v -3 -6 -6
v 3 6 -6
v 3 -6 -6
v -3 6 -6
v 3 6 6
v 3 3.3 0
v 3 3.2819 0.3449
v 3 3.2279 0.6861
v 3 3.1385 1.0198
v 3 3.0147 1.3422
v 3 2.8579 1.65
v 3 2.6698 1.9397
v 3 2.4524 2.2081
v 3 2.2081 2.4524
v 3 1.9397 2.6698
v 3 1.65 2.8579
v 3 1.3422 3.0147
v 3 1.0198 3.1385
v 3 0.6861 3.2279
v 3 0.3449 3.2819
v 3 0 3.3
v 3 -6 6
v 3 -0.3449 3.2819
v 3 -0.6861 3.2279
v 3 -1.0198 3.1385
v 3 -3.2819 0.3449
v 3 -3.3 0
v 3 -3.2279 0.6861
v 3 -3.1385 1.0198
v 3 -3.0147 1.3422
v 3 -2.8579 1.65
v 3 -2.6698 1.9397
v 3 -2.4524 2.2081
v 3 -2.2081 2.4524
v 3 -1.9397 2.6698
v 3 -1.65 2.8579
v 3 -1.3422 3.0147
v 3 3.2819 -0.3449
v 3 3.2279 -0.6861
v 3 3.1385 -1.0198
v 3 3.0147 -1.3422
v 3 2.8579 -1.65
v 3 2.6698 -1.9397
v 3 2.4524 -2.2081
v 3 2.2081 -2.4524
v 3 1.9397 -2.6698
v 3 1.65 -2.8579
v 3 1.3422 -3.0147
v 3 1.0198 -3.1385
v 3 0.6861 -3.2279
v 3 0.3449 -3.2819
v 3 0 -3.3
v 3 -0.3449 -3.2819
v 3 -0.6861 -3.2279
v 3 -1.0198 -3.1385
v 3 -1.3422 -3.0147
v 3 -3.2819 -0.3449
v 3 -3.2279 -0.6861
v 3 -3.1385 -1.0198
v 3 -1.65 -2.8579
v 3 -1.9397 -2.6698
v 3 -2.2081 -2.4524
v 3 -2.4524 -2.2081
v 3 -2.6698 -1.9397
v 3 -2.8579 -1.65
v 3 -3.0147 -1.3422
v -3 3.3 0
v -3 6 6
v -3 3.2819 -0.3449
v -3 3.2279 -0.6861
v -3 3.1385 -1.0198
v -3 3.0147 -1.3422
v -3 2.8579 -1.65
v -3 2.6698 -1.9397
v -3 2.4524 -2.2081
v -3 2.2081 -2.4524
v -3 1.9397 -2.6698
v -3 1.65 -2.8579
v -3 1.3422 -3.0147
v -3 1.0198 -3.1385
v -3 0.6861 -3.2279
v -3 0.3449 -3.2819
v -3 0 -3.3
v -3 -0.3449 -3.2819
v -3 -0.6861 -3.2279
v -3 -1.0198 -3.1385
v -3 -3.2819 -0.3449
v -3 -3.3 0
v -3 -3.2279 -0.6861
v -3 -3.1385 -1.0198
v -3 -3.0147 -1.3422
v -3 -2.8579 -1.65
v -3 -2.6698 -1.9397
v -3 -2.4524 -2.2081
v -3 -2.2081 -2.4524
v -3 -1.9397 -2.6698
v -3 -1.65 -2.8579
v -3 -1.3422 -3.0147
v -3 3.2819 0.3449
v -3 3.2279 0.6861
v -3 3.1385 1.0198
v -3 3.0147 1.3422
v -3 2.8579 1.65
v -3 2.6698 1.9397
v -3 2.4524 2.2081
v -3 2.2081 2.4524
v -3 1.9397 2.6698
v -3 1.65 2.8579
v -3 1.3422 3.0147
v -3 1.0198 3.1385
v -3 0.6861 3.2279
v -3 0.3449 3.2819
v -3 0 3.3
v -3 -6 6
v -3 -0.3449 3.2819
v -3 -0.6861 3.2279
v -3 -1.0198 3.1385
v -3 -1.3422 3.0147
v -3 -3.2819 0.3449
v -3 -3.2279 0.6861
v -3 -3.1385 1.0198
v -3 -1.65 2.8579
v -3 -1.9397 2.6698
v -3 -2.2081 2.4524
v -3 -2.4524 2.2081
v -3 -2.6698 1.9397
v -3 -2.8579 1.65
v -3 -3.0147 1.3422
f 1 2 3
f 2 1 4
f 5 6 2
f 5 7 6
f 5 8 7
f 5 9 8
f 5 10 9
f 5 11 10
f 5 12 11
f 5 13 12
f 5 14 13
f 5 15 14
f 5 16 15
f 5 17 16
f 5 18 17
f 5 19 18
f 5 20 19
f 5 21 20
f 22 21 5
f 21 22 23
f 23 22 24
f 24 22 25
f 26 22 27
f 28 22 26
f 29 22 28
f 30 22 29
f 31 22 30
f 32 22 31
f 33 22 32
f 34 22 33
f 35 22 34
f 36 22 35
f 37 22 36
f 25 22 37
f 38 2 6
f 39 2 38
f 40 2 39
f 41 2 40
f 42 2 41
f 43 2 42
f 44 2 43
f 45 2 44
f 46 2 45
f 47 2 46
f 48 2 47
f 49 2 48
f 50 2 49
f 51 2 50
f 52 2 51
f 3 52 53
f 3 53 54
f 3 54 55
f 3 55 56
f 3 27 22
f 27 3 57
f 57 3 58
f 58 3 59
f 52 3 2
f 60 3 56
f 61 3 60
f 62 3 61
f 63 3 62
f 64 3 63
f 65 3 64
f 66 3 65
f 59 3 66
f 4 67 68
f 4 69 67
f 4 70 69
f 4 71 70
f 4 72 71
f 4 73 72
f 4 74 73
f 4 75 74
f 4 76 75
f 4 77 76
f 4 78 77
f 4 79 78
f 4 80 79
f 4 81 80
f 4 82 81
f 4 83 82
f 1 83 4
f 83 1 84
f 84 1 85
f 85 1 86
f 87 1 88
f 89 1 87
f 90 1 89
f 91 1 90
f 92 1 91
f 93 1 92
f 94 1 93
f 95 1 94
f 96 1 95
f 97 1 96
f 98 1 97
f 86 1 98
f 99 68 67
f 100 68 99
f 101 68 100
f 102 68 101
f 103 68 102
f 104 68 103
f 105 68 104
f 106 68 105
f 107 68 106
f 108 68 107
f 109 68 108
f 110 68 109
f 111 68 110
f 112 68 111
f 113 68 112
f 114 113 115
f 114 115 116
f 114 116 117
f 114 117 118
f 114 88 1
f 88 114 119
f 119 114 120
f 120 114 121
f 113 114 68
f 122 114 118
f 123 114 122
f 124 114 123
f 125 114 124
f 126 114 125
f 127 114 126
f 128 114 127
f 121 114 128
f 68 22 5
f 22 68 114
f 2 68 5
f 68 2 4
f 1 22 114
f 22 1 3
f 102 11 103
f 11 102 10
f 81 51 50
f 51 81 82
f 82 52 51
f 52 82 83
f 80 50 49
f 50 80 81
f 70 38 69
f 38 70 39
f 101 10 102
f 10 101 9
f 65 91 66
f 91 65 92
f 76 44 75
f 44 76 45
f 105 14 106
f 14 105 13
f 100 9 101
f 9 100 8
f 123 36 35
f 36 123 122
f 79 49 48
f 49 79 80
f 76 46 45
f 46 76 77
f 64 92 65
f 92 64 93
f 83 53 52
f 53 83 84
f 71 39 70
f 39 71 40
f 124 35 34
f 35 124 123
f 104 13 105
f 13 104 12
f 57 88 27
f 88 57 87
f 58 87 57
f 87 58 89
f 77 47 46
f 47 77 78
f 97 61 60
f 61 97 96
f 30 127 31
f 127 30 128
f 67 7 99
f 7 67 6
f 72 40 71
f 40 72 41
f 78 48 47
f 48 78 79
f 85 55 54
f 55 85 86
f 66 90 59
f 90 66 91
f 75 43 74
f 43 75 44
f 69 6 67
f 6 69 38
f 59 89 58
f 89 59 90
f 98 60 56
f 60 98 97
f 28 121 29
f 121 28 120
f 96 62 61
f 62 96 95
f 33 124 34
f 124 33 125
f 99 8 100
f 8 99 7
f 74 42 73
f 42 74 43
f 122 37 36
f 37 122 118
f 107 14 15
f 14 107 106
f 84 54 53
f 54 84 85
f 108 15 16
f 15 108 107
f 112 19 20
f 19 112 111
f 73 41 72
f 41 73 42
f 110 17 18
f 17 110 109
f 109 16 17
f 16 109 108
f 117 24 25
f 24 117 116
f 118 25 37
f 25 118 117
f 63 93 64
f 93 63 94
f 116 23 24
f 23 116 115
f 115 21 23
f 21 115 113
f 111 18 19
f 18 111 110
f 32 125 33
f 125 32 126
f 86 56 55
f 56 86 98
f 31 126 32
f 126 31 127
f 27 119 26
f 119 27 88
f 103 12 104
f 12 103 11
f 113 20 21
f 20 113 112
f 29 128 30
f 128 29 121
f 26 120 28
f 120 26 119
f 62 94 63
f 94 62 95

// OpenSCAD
$fn=60;

rotate([0,90,0]) difference()
  {
    cube([12,12,6], center=true);
    translate([0,0,0]) rotate([0,0,0])  cylinder(h=100, r=3*1.1, center=true);

//    cube([12,24,6], center=true);
//    translate([0,6,0]) rotate([0,0,0])  cylinder(h=100, r=3*1.1, center=true);
//    translate([0,-6,0]) rotate([0,0,0])  cylinder(h=100, r=3*1.075, center=true);
  }
